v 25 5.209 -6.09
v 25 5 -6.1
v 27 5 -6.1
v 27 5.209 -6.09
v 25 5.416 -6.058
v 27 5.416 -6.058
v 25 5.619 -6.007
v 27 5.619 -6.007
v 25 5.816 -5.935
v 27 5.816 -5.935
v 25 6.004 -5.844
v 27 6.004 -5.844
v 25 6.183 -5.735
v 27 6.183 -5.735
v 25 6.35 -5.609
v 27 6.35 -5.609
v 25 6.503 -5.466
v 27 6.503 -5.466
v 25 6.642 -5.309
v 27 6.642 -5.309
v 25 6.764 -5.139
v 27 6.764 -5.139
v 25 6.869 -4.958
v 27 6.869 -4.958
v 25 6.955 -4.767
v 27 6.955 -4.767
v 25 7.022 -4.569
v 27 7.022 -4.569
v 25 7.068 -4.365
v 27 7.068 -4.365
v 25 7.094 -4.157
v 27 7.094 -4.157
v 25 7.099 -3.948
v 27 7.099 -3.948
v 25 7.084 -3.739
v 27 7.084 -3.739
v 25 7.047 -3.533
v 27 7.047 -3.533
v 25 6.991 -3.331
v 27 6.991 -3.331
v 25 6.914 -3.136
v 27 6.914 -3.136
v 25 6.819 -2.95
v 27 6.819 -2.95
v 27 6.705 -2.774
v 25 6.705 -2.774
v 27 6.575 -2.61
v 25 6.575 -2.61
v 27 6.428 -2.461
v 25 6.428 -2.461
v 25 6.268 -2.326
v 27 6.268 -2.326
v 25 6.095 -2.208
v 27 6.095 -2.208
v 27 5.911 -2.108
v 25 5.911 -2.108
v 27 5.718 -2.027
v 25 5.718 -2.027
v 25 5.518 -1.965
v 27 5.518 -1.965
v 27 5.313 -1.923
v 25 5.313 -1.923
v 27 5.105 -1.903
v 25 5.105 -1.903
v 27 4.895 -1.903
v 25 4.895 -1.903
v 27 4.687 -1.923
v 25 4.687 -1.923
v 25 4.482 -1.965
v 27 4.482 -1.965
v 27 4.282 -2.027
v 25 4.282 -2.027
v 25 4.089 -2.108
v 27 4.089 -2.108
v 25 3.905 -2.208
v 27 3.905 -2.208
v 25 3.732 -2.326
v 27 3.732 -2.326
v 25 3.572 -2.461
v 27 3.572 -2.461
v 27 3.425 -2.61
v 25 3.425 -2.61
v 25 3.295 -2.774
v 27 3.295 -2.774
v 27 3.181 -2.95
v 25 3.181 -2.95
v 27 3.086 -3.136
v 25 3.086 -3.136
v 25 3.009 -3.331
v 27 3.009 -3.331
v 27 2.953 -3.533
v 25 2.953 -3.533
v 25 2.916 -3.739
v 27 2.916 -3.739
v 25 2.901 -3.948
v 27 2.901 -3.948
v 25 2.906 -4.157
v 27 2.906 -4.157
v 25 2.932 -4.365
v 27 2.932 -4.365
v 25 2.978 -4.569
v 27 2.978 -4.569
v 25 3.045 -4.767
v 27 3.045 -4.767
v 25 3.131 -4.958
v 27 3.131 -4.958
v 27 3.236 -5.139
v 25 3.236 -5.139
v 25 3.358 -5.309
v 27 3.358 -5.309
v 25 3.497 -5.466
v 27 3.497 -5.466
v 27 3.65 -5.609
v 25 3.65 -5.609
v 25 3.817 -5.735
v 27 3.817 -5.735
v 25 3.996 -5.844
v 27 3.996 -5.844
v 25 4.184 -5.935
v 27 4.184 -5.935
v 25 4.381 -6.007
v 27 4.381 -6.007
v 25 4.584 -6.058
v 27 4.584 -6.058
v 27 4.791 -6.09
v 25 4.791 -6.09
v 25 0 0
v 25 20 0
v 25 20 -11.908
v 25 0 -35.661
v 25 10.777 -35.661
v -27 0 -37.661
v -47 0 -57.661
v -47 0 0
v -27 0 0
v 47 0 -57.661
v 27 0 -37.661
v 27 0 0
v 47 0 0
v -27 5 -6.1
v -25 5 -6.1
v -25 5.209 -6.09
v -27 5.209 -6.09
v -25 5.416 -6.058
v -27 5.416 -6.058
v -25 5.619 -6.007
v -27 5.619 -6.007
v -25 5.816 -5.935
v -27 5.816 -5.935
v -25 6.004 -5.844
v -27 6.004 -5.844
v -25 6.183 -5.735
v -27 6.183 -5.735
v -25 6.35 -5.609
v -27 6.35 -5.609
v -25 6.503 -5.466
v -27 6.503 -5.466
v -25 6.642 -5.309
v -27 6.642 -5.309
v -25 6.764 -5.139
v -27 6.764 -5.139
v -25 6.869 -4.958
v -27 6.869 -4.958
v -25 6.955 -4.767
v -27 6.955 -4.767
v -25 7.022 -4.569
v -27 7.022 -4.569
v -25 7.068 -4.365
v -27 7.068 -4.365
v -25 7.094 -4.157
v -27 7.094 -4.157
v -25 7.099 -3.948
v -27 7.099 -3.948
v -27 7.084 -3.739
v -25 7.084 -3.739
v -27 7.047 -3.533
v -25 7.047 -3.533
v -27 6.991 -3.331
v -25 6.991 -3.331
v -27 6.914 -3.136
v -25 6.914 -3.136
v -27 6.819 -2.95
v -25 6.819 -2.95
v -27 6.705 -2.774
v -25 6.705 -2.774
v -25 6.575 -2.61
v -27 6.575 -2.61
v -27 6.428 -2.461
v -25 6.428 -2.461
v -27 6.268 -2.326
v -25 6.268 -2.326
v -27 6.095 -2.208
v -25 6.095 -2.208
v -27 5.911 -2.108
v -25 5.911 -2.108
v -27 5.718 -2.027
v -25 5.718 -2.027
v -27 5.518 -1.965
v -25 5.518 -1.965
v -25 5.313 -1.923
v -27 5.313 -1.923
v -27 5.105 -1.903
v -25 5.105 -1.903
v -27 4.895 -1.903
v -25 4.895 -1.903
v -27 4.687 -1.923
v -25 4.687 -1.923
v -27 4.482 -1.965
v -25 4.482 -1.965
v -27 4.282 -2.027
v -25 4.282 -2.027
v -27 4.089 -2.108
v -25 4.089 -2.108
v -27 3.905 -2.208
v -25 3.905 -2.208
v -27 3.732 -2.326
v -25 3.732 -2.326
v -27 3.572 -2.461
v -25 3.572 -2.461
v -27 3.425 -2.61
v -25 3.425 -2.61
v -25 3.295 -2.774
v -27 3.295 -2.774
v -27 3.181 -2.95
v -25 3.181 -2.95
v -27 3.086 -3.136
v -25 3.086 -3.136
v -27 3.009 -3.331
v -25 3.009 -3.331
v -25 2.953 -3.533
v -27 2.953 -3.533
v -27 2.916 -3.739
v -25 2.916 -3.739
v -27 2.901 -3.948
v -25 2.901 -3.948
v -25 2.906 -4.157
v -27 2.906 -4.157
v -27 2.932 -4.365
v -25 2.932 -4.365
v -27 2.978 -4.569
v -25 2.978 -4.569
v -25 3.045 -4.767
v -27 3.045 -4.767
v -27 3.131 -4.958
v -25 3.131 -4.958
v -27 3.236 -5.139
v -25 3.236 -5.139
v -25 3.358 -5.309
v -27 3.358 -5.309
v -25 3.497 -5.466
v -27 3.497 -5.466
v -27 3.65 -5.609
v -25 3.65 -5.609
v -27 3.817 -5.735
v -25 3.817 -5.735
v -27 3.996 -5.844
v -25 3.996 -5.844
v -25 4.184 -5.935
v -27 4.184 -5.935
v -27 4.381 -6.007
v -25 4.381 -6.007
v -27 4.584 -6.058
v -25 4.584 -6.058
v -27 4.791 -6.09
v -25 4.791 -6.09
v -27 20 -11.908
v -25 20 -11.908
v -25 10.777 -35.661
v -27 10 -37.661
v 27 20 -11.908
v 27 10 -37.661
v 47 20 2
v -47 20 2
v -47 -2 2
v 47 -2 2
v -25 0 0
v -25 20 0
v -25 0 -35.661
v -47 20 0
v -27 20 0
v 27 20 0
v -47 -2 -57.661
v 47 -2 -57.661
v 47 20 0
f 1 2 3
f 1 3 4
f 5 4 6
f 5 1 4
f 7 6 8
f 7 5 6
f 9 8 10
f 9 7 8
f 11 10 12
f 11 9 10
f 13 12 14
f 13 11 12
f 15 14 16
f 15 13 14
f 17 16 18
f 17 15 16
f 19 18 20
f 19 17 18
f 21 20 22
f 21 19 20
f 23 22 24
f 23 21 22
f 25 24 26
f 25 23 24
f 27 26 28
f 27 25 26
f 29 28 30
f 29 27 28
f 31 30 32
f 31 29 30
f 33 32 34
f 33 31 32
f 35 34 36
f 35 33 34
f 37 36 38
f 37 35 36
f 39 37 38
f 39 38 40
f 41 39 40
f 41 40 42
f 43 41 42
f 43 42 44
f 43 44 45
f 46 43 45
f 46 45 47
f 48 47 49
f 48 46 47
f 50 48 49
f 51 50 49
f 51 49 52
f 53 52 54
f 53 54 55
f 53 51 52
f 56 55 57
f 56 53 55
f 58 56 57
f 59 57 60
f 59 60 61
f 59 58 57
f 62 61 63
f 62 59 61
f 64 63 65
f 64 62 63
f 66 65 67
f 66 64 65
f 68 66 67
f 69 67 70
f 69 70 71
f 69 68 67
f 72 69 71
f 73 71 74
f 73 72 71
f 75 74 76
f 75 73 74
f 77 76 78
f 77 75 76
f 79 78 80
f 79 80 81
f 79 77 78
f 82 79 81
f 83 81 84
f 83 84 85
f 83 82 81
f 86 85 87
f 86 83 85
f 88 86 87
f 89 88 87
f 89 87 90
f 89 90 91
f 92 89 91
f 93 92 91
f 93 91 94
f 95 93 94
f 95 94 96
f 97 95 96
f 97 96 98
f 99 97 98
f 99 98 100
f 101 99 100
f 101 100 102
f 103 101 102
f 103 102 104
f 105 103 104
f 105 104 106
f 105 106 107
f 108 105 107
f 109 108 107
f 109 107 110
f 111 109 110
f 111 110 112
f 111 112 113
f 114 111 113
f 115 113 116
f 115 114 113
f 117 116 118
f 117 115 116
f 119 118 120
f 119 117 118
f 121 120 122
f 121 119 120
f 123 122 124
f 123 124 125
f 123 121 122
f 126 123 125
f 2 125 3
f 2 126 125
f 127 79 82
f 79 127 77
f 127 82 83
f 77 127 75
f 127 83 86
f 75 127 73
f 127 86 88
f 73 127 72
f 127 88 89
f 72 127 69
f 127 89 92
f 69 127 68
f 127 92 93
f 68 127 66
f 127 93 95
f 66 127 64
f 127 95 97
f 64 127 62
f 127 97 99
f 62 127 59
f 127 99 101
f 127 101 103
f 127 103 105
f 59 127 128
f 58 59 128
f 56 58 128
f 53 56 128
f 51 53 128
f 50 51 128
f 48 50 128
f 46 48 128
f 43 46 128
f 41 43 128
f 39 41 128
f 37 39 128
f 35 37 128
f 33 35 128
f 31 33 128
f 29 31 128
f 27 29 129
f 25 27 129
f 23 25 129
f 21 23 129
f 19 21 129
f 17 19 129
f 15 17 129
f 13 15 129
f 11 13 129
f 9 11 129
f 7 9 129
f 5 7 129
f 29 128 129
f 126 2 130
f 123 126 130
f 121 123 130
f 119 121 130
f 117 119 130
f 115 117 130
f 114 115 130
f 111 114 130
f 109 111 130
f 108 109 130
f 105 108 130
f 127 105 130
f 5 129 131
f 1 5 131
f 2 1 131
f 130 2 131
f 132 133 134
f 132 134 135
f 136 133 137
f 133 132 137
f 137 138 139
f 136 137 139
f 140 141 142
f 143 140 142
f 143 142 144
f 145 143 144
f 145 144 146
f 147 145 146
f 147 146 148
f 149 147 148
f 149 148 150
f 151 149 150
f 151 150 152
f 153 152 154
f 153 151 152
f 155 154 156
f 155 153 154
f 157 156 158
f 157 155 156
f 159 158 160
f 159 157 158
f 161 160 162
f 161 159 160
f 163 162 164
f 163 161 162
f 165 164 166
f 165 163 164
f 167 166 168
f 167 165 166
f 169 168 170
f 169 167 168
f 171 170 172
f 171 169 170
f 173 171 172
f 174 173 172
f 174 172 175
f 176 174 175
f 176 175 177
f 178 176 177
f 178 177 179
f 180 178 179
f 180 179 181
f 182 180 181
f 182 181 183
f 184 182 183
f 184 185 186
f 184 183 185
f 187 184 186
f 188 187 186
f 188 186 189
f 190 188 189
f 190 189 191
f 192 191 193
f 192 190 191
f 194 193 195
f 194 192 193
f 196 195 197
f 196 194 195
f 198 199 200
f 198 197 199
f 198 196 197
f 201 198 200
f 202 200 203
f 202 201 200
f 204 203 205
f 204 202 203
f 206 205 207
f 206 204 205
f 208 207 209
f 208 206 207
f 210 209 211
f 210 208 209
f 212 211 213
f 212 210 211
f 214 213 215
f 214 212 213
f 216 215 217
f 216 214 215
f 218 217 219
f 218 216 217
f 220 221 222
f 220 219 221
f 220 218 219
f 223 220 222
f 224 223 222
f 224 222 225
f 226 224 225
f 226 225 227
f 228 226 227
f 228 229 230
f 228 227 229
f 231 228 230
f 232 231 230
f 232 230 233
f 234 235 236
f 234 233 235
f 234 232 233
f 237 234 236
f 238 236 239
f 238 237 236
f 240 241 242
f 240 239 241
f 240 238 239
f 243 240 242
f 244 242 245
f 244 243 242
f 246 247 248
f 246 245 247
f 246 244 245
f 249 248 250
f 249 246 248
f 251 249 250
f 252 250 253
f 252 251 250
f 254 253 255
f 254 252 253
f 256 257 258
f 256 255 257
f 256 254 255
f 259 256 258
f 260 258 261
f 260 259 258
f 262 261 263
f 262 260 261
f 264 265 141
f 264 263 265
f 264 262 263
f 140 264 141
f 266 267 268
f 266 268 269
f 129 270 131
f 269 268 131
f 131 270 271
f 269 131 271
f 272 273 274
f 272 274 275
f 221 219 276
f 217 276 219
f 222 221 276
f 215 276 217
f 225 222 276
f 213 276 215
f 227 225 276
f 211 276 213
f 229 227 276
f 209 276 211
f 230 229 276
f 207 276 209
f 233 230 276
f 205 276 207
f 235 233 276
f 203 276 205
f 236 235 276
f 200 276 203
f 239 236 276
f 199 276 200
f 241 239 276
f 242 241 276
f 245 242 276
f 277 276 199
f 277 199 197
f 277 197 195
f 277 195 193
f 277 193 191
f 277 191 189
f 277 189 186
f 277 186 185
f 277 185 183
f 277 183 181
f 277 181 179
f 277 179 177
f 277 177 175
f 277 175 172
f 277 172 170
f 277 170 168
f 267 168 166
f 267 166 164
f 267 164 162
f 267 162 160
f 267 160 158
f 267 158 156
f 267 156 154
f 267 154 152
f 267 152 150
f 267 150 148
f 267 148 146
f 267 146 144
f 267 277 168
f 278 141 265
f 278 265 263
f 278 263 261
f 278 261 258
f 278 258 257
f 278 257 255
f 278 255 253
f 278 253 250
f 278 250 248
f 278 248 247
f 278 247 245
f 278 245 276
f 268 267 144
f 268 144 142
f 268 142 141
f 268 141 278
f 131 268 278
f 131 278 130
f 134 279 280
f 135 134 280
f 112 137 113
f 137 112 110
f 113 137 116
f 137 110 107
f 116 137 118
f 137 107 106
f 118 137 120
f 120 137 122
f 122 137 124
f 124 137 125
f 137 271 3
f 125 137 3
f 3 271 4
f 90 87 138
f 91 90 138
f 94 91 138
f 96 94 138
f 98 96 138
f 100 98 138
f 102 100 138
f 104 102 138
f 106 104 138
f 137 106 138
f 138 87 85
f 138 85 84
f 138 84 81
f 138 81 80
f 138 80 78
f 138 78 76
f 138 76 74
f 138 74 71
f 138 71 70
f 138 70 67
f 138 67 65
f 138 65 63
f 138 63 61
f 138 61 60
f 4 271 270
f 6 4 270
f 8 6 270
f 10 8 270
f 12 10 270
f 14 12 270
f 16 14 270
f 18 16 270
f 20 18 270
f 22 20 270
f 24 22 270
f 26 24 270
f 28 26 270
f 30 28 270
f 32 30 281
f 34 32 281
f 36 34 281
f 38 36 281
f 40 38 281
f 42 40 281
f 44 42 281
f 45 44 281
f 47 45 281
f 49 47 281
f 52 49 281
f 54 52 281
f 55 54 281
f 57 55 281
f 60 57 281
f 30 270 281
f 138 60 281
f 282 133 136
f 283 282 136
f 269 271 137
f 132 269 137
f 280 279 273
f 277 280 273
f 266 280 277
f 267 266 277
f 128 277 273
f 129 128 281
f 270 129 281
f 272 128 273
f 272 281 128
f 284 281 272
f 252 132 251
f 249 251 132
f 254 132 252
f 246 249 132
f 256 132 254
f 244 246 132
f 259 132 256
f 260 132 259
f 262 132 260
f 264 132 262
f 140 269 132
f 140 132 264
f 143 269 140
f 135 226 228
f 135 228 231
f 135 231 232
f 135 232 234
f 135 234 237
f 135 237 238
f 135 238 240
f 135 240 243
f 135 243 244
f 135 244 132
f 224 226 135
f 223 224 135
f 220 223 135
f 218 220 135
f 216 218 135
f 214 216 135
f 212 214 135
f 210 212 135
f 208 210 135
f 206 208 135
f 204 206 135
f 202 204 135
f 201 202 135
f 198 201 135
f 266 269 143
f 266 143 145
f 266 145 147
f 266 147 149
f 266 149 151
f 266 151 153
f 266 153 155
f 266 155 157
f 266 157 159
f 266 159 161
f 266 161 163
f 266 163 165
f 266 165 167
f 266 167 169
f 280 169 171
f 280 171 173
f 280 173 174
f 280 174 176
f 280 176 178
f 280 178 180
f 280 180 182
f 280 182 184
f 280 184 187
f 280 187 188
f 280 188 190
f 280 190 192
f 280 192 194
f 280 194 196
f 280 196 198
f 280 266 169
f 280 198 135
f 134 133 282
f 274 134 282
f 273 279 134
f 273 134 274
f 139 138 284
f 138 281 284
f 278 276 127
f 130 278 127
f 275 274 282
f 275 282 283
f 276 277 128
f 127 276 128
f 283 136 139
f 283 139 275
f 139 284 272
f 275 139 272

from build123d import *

# Parameters (mm, degrees)
CROQUIS1_R              = 2.1
SALIENTE_EXTRUIR1_DEPTH = 27
CROQUIS2_W              = 50
CROQUIS2_H              = 35.661242199
CORTAR_EXTRUIR1_DEPTH   = 20
CROQUIS3_W              = 94
CROQUIS3_H              = 22
SALIENTE_EXTRUIR2_DEPTH = 2
CROQUIS4_W              = 94
CROQUIS4_H              = 57.661242199
SALIENTE_EXTRUIR3_DEPTH = 2


with BuildPart() as part:
    # Croquis1 → Saliente-Extruir1 (new body, symmetric)
    with BuildSketch(Plane(origin=(0, 0, 0), x_dir=(0, 0, -1), z_dir=(1, 0, 0))):
        Polygon((0, 0), (0, 20), (11.90751736, 20), (37.661242199, 10), (37.661242199, 0), align=None)
        with Locations((4, 5)):
            Circle(CROQUIS1_R, mode=Mode.SUBTRACT)
    extrude(amount=SALIENTE_EXTRUIR1_DEPTH, both=True)

    # Croquis2 → Cortar-Extruir1 (cut)
    with BuildSketch(Plane(origin=(0, 20, 0), x_dir=(1, 0, 0), z_dir=(0, 1, 0))):
        with Locations((0, 17.8306211)):
            Rectangle(CROQUIS2_W, CROQUIS2_H)
    extrude(amount=-CORTAR_EXTRUIR1_DEPTH, mode=Mode.SUBTRACT)

    # Croquis3 → Saliente-Extruir2 (add)
    with BuildSketch(Plane.XY):
        with Locations((0, 9)):
            Rectangle(CROQUIS3_W, CROQUIS3_H)
    extrude(amount=SALIENTE_EXTRUIR2_DEPTH)

    # Croquis4 → Saliente-Extruir3 (add)
    with BuildSketch(Plane.XZ):
        with Locations((0, -28.8306211)):
            Rectangle(CROQUIS4_W, CROQUIS4_H)
    extrude(amount=SALIENTE_EXTRUIR3_DEPTH)


solid = part.part
